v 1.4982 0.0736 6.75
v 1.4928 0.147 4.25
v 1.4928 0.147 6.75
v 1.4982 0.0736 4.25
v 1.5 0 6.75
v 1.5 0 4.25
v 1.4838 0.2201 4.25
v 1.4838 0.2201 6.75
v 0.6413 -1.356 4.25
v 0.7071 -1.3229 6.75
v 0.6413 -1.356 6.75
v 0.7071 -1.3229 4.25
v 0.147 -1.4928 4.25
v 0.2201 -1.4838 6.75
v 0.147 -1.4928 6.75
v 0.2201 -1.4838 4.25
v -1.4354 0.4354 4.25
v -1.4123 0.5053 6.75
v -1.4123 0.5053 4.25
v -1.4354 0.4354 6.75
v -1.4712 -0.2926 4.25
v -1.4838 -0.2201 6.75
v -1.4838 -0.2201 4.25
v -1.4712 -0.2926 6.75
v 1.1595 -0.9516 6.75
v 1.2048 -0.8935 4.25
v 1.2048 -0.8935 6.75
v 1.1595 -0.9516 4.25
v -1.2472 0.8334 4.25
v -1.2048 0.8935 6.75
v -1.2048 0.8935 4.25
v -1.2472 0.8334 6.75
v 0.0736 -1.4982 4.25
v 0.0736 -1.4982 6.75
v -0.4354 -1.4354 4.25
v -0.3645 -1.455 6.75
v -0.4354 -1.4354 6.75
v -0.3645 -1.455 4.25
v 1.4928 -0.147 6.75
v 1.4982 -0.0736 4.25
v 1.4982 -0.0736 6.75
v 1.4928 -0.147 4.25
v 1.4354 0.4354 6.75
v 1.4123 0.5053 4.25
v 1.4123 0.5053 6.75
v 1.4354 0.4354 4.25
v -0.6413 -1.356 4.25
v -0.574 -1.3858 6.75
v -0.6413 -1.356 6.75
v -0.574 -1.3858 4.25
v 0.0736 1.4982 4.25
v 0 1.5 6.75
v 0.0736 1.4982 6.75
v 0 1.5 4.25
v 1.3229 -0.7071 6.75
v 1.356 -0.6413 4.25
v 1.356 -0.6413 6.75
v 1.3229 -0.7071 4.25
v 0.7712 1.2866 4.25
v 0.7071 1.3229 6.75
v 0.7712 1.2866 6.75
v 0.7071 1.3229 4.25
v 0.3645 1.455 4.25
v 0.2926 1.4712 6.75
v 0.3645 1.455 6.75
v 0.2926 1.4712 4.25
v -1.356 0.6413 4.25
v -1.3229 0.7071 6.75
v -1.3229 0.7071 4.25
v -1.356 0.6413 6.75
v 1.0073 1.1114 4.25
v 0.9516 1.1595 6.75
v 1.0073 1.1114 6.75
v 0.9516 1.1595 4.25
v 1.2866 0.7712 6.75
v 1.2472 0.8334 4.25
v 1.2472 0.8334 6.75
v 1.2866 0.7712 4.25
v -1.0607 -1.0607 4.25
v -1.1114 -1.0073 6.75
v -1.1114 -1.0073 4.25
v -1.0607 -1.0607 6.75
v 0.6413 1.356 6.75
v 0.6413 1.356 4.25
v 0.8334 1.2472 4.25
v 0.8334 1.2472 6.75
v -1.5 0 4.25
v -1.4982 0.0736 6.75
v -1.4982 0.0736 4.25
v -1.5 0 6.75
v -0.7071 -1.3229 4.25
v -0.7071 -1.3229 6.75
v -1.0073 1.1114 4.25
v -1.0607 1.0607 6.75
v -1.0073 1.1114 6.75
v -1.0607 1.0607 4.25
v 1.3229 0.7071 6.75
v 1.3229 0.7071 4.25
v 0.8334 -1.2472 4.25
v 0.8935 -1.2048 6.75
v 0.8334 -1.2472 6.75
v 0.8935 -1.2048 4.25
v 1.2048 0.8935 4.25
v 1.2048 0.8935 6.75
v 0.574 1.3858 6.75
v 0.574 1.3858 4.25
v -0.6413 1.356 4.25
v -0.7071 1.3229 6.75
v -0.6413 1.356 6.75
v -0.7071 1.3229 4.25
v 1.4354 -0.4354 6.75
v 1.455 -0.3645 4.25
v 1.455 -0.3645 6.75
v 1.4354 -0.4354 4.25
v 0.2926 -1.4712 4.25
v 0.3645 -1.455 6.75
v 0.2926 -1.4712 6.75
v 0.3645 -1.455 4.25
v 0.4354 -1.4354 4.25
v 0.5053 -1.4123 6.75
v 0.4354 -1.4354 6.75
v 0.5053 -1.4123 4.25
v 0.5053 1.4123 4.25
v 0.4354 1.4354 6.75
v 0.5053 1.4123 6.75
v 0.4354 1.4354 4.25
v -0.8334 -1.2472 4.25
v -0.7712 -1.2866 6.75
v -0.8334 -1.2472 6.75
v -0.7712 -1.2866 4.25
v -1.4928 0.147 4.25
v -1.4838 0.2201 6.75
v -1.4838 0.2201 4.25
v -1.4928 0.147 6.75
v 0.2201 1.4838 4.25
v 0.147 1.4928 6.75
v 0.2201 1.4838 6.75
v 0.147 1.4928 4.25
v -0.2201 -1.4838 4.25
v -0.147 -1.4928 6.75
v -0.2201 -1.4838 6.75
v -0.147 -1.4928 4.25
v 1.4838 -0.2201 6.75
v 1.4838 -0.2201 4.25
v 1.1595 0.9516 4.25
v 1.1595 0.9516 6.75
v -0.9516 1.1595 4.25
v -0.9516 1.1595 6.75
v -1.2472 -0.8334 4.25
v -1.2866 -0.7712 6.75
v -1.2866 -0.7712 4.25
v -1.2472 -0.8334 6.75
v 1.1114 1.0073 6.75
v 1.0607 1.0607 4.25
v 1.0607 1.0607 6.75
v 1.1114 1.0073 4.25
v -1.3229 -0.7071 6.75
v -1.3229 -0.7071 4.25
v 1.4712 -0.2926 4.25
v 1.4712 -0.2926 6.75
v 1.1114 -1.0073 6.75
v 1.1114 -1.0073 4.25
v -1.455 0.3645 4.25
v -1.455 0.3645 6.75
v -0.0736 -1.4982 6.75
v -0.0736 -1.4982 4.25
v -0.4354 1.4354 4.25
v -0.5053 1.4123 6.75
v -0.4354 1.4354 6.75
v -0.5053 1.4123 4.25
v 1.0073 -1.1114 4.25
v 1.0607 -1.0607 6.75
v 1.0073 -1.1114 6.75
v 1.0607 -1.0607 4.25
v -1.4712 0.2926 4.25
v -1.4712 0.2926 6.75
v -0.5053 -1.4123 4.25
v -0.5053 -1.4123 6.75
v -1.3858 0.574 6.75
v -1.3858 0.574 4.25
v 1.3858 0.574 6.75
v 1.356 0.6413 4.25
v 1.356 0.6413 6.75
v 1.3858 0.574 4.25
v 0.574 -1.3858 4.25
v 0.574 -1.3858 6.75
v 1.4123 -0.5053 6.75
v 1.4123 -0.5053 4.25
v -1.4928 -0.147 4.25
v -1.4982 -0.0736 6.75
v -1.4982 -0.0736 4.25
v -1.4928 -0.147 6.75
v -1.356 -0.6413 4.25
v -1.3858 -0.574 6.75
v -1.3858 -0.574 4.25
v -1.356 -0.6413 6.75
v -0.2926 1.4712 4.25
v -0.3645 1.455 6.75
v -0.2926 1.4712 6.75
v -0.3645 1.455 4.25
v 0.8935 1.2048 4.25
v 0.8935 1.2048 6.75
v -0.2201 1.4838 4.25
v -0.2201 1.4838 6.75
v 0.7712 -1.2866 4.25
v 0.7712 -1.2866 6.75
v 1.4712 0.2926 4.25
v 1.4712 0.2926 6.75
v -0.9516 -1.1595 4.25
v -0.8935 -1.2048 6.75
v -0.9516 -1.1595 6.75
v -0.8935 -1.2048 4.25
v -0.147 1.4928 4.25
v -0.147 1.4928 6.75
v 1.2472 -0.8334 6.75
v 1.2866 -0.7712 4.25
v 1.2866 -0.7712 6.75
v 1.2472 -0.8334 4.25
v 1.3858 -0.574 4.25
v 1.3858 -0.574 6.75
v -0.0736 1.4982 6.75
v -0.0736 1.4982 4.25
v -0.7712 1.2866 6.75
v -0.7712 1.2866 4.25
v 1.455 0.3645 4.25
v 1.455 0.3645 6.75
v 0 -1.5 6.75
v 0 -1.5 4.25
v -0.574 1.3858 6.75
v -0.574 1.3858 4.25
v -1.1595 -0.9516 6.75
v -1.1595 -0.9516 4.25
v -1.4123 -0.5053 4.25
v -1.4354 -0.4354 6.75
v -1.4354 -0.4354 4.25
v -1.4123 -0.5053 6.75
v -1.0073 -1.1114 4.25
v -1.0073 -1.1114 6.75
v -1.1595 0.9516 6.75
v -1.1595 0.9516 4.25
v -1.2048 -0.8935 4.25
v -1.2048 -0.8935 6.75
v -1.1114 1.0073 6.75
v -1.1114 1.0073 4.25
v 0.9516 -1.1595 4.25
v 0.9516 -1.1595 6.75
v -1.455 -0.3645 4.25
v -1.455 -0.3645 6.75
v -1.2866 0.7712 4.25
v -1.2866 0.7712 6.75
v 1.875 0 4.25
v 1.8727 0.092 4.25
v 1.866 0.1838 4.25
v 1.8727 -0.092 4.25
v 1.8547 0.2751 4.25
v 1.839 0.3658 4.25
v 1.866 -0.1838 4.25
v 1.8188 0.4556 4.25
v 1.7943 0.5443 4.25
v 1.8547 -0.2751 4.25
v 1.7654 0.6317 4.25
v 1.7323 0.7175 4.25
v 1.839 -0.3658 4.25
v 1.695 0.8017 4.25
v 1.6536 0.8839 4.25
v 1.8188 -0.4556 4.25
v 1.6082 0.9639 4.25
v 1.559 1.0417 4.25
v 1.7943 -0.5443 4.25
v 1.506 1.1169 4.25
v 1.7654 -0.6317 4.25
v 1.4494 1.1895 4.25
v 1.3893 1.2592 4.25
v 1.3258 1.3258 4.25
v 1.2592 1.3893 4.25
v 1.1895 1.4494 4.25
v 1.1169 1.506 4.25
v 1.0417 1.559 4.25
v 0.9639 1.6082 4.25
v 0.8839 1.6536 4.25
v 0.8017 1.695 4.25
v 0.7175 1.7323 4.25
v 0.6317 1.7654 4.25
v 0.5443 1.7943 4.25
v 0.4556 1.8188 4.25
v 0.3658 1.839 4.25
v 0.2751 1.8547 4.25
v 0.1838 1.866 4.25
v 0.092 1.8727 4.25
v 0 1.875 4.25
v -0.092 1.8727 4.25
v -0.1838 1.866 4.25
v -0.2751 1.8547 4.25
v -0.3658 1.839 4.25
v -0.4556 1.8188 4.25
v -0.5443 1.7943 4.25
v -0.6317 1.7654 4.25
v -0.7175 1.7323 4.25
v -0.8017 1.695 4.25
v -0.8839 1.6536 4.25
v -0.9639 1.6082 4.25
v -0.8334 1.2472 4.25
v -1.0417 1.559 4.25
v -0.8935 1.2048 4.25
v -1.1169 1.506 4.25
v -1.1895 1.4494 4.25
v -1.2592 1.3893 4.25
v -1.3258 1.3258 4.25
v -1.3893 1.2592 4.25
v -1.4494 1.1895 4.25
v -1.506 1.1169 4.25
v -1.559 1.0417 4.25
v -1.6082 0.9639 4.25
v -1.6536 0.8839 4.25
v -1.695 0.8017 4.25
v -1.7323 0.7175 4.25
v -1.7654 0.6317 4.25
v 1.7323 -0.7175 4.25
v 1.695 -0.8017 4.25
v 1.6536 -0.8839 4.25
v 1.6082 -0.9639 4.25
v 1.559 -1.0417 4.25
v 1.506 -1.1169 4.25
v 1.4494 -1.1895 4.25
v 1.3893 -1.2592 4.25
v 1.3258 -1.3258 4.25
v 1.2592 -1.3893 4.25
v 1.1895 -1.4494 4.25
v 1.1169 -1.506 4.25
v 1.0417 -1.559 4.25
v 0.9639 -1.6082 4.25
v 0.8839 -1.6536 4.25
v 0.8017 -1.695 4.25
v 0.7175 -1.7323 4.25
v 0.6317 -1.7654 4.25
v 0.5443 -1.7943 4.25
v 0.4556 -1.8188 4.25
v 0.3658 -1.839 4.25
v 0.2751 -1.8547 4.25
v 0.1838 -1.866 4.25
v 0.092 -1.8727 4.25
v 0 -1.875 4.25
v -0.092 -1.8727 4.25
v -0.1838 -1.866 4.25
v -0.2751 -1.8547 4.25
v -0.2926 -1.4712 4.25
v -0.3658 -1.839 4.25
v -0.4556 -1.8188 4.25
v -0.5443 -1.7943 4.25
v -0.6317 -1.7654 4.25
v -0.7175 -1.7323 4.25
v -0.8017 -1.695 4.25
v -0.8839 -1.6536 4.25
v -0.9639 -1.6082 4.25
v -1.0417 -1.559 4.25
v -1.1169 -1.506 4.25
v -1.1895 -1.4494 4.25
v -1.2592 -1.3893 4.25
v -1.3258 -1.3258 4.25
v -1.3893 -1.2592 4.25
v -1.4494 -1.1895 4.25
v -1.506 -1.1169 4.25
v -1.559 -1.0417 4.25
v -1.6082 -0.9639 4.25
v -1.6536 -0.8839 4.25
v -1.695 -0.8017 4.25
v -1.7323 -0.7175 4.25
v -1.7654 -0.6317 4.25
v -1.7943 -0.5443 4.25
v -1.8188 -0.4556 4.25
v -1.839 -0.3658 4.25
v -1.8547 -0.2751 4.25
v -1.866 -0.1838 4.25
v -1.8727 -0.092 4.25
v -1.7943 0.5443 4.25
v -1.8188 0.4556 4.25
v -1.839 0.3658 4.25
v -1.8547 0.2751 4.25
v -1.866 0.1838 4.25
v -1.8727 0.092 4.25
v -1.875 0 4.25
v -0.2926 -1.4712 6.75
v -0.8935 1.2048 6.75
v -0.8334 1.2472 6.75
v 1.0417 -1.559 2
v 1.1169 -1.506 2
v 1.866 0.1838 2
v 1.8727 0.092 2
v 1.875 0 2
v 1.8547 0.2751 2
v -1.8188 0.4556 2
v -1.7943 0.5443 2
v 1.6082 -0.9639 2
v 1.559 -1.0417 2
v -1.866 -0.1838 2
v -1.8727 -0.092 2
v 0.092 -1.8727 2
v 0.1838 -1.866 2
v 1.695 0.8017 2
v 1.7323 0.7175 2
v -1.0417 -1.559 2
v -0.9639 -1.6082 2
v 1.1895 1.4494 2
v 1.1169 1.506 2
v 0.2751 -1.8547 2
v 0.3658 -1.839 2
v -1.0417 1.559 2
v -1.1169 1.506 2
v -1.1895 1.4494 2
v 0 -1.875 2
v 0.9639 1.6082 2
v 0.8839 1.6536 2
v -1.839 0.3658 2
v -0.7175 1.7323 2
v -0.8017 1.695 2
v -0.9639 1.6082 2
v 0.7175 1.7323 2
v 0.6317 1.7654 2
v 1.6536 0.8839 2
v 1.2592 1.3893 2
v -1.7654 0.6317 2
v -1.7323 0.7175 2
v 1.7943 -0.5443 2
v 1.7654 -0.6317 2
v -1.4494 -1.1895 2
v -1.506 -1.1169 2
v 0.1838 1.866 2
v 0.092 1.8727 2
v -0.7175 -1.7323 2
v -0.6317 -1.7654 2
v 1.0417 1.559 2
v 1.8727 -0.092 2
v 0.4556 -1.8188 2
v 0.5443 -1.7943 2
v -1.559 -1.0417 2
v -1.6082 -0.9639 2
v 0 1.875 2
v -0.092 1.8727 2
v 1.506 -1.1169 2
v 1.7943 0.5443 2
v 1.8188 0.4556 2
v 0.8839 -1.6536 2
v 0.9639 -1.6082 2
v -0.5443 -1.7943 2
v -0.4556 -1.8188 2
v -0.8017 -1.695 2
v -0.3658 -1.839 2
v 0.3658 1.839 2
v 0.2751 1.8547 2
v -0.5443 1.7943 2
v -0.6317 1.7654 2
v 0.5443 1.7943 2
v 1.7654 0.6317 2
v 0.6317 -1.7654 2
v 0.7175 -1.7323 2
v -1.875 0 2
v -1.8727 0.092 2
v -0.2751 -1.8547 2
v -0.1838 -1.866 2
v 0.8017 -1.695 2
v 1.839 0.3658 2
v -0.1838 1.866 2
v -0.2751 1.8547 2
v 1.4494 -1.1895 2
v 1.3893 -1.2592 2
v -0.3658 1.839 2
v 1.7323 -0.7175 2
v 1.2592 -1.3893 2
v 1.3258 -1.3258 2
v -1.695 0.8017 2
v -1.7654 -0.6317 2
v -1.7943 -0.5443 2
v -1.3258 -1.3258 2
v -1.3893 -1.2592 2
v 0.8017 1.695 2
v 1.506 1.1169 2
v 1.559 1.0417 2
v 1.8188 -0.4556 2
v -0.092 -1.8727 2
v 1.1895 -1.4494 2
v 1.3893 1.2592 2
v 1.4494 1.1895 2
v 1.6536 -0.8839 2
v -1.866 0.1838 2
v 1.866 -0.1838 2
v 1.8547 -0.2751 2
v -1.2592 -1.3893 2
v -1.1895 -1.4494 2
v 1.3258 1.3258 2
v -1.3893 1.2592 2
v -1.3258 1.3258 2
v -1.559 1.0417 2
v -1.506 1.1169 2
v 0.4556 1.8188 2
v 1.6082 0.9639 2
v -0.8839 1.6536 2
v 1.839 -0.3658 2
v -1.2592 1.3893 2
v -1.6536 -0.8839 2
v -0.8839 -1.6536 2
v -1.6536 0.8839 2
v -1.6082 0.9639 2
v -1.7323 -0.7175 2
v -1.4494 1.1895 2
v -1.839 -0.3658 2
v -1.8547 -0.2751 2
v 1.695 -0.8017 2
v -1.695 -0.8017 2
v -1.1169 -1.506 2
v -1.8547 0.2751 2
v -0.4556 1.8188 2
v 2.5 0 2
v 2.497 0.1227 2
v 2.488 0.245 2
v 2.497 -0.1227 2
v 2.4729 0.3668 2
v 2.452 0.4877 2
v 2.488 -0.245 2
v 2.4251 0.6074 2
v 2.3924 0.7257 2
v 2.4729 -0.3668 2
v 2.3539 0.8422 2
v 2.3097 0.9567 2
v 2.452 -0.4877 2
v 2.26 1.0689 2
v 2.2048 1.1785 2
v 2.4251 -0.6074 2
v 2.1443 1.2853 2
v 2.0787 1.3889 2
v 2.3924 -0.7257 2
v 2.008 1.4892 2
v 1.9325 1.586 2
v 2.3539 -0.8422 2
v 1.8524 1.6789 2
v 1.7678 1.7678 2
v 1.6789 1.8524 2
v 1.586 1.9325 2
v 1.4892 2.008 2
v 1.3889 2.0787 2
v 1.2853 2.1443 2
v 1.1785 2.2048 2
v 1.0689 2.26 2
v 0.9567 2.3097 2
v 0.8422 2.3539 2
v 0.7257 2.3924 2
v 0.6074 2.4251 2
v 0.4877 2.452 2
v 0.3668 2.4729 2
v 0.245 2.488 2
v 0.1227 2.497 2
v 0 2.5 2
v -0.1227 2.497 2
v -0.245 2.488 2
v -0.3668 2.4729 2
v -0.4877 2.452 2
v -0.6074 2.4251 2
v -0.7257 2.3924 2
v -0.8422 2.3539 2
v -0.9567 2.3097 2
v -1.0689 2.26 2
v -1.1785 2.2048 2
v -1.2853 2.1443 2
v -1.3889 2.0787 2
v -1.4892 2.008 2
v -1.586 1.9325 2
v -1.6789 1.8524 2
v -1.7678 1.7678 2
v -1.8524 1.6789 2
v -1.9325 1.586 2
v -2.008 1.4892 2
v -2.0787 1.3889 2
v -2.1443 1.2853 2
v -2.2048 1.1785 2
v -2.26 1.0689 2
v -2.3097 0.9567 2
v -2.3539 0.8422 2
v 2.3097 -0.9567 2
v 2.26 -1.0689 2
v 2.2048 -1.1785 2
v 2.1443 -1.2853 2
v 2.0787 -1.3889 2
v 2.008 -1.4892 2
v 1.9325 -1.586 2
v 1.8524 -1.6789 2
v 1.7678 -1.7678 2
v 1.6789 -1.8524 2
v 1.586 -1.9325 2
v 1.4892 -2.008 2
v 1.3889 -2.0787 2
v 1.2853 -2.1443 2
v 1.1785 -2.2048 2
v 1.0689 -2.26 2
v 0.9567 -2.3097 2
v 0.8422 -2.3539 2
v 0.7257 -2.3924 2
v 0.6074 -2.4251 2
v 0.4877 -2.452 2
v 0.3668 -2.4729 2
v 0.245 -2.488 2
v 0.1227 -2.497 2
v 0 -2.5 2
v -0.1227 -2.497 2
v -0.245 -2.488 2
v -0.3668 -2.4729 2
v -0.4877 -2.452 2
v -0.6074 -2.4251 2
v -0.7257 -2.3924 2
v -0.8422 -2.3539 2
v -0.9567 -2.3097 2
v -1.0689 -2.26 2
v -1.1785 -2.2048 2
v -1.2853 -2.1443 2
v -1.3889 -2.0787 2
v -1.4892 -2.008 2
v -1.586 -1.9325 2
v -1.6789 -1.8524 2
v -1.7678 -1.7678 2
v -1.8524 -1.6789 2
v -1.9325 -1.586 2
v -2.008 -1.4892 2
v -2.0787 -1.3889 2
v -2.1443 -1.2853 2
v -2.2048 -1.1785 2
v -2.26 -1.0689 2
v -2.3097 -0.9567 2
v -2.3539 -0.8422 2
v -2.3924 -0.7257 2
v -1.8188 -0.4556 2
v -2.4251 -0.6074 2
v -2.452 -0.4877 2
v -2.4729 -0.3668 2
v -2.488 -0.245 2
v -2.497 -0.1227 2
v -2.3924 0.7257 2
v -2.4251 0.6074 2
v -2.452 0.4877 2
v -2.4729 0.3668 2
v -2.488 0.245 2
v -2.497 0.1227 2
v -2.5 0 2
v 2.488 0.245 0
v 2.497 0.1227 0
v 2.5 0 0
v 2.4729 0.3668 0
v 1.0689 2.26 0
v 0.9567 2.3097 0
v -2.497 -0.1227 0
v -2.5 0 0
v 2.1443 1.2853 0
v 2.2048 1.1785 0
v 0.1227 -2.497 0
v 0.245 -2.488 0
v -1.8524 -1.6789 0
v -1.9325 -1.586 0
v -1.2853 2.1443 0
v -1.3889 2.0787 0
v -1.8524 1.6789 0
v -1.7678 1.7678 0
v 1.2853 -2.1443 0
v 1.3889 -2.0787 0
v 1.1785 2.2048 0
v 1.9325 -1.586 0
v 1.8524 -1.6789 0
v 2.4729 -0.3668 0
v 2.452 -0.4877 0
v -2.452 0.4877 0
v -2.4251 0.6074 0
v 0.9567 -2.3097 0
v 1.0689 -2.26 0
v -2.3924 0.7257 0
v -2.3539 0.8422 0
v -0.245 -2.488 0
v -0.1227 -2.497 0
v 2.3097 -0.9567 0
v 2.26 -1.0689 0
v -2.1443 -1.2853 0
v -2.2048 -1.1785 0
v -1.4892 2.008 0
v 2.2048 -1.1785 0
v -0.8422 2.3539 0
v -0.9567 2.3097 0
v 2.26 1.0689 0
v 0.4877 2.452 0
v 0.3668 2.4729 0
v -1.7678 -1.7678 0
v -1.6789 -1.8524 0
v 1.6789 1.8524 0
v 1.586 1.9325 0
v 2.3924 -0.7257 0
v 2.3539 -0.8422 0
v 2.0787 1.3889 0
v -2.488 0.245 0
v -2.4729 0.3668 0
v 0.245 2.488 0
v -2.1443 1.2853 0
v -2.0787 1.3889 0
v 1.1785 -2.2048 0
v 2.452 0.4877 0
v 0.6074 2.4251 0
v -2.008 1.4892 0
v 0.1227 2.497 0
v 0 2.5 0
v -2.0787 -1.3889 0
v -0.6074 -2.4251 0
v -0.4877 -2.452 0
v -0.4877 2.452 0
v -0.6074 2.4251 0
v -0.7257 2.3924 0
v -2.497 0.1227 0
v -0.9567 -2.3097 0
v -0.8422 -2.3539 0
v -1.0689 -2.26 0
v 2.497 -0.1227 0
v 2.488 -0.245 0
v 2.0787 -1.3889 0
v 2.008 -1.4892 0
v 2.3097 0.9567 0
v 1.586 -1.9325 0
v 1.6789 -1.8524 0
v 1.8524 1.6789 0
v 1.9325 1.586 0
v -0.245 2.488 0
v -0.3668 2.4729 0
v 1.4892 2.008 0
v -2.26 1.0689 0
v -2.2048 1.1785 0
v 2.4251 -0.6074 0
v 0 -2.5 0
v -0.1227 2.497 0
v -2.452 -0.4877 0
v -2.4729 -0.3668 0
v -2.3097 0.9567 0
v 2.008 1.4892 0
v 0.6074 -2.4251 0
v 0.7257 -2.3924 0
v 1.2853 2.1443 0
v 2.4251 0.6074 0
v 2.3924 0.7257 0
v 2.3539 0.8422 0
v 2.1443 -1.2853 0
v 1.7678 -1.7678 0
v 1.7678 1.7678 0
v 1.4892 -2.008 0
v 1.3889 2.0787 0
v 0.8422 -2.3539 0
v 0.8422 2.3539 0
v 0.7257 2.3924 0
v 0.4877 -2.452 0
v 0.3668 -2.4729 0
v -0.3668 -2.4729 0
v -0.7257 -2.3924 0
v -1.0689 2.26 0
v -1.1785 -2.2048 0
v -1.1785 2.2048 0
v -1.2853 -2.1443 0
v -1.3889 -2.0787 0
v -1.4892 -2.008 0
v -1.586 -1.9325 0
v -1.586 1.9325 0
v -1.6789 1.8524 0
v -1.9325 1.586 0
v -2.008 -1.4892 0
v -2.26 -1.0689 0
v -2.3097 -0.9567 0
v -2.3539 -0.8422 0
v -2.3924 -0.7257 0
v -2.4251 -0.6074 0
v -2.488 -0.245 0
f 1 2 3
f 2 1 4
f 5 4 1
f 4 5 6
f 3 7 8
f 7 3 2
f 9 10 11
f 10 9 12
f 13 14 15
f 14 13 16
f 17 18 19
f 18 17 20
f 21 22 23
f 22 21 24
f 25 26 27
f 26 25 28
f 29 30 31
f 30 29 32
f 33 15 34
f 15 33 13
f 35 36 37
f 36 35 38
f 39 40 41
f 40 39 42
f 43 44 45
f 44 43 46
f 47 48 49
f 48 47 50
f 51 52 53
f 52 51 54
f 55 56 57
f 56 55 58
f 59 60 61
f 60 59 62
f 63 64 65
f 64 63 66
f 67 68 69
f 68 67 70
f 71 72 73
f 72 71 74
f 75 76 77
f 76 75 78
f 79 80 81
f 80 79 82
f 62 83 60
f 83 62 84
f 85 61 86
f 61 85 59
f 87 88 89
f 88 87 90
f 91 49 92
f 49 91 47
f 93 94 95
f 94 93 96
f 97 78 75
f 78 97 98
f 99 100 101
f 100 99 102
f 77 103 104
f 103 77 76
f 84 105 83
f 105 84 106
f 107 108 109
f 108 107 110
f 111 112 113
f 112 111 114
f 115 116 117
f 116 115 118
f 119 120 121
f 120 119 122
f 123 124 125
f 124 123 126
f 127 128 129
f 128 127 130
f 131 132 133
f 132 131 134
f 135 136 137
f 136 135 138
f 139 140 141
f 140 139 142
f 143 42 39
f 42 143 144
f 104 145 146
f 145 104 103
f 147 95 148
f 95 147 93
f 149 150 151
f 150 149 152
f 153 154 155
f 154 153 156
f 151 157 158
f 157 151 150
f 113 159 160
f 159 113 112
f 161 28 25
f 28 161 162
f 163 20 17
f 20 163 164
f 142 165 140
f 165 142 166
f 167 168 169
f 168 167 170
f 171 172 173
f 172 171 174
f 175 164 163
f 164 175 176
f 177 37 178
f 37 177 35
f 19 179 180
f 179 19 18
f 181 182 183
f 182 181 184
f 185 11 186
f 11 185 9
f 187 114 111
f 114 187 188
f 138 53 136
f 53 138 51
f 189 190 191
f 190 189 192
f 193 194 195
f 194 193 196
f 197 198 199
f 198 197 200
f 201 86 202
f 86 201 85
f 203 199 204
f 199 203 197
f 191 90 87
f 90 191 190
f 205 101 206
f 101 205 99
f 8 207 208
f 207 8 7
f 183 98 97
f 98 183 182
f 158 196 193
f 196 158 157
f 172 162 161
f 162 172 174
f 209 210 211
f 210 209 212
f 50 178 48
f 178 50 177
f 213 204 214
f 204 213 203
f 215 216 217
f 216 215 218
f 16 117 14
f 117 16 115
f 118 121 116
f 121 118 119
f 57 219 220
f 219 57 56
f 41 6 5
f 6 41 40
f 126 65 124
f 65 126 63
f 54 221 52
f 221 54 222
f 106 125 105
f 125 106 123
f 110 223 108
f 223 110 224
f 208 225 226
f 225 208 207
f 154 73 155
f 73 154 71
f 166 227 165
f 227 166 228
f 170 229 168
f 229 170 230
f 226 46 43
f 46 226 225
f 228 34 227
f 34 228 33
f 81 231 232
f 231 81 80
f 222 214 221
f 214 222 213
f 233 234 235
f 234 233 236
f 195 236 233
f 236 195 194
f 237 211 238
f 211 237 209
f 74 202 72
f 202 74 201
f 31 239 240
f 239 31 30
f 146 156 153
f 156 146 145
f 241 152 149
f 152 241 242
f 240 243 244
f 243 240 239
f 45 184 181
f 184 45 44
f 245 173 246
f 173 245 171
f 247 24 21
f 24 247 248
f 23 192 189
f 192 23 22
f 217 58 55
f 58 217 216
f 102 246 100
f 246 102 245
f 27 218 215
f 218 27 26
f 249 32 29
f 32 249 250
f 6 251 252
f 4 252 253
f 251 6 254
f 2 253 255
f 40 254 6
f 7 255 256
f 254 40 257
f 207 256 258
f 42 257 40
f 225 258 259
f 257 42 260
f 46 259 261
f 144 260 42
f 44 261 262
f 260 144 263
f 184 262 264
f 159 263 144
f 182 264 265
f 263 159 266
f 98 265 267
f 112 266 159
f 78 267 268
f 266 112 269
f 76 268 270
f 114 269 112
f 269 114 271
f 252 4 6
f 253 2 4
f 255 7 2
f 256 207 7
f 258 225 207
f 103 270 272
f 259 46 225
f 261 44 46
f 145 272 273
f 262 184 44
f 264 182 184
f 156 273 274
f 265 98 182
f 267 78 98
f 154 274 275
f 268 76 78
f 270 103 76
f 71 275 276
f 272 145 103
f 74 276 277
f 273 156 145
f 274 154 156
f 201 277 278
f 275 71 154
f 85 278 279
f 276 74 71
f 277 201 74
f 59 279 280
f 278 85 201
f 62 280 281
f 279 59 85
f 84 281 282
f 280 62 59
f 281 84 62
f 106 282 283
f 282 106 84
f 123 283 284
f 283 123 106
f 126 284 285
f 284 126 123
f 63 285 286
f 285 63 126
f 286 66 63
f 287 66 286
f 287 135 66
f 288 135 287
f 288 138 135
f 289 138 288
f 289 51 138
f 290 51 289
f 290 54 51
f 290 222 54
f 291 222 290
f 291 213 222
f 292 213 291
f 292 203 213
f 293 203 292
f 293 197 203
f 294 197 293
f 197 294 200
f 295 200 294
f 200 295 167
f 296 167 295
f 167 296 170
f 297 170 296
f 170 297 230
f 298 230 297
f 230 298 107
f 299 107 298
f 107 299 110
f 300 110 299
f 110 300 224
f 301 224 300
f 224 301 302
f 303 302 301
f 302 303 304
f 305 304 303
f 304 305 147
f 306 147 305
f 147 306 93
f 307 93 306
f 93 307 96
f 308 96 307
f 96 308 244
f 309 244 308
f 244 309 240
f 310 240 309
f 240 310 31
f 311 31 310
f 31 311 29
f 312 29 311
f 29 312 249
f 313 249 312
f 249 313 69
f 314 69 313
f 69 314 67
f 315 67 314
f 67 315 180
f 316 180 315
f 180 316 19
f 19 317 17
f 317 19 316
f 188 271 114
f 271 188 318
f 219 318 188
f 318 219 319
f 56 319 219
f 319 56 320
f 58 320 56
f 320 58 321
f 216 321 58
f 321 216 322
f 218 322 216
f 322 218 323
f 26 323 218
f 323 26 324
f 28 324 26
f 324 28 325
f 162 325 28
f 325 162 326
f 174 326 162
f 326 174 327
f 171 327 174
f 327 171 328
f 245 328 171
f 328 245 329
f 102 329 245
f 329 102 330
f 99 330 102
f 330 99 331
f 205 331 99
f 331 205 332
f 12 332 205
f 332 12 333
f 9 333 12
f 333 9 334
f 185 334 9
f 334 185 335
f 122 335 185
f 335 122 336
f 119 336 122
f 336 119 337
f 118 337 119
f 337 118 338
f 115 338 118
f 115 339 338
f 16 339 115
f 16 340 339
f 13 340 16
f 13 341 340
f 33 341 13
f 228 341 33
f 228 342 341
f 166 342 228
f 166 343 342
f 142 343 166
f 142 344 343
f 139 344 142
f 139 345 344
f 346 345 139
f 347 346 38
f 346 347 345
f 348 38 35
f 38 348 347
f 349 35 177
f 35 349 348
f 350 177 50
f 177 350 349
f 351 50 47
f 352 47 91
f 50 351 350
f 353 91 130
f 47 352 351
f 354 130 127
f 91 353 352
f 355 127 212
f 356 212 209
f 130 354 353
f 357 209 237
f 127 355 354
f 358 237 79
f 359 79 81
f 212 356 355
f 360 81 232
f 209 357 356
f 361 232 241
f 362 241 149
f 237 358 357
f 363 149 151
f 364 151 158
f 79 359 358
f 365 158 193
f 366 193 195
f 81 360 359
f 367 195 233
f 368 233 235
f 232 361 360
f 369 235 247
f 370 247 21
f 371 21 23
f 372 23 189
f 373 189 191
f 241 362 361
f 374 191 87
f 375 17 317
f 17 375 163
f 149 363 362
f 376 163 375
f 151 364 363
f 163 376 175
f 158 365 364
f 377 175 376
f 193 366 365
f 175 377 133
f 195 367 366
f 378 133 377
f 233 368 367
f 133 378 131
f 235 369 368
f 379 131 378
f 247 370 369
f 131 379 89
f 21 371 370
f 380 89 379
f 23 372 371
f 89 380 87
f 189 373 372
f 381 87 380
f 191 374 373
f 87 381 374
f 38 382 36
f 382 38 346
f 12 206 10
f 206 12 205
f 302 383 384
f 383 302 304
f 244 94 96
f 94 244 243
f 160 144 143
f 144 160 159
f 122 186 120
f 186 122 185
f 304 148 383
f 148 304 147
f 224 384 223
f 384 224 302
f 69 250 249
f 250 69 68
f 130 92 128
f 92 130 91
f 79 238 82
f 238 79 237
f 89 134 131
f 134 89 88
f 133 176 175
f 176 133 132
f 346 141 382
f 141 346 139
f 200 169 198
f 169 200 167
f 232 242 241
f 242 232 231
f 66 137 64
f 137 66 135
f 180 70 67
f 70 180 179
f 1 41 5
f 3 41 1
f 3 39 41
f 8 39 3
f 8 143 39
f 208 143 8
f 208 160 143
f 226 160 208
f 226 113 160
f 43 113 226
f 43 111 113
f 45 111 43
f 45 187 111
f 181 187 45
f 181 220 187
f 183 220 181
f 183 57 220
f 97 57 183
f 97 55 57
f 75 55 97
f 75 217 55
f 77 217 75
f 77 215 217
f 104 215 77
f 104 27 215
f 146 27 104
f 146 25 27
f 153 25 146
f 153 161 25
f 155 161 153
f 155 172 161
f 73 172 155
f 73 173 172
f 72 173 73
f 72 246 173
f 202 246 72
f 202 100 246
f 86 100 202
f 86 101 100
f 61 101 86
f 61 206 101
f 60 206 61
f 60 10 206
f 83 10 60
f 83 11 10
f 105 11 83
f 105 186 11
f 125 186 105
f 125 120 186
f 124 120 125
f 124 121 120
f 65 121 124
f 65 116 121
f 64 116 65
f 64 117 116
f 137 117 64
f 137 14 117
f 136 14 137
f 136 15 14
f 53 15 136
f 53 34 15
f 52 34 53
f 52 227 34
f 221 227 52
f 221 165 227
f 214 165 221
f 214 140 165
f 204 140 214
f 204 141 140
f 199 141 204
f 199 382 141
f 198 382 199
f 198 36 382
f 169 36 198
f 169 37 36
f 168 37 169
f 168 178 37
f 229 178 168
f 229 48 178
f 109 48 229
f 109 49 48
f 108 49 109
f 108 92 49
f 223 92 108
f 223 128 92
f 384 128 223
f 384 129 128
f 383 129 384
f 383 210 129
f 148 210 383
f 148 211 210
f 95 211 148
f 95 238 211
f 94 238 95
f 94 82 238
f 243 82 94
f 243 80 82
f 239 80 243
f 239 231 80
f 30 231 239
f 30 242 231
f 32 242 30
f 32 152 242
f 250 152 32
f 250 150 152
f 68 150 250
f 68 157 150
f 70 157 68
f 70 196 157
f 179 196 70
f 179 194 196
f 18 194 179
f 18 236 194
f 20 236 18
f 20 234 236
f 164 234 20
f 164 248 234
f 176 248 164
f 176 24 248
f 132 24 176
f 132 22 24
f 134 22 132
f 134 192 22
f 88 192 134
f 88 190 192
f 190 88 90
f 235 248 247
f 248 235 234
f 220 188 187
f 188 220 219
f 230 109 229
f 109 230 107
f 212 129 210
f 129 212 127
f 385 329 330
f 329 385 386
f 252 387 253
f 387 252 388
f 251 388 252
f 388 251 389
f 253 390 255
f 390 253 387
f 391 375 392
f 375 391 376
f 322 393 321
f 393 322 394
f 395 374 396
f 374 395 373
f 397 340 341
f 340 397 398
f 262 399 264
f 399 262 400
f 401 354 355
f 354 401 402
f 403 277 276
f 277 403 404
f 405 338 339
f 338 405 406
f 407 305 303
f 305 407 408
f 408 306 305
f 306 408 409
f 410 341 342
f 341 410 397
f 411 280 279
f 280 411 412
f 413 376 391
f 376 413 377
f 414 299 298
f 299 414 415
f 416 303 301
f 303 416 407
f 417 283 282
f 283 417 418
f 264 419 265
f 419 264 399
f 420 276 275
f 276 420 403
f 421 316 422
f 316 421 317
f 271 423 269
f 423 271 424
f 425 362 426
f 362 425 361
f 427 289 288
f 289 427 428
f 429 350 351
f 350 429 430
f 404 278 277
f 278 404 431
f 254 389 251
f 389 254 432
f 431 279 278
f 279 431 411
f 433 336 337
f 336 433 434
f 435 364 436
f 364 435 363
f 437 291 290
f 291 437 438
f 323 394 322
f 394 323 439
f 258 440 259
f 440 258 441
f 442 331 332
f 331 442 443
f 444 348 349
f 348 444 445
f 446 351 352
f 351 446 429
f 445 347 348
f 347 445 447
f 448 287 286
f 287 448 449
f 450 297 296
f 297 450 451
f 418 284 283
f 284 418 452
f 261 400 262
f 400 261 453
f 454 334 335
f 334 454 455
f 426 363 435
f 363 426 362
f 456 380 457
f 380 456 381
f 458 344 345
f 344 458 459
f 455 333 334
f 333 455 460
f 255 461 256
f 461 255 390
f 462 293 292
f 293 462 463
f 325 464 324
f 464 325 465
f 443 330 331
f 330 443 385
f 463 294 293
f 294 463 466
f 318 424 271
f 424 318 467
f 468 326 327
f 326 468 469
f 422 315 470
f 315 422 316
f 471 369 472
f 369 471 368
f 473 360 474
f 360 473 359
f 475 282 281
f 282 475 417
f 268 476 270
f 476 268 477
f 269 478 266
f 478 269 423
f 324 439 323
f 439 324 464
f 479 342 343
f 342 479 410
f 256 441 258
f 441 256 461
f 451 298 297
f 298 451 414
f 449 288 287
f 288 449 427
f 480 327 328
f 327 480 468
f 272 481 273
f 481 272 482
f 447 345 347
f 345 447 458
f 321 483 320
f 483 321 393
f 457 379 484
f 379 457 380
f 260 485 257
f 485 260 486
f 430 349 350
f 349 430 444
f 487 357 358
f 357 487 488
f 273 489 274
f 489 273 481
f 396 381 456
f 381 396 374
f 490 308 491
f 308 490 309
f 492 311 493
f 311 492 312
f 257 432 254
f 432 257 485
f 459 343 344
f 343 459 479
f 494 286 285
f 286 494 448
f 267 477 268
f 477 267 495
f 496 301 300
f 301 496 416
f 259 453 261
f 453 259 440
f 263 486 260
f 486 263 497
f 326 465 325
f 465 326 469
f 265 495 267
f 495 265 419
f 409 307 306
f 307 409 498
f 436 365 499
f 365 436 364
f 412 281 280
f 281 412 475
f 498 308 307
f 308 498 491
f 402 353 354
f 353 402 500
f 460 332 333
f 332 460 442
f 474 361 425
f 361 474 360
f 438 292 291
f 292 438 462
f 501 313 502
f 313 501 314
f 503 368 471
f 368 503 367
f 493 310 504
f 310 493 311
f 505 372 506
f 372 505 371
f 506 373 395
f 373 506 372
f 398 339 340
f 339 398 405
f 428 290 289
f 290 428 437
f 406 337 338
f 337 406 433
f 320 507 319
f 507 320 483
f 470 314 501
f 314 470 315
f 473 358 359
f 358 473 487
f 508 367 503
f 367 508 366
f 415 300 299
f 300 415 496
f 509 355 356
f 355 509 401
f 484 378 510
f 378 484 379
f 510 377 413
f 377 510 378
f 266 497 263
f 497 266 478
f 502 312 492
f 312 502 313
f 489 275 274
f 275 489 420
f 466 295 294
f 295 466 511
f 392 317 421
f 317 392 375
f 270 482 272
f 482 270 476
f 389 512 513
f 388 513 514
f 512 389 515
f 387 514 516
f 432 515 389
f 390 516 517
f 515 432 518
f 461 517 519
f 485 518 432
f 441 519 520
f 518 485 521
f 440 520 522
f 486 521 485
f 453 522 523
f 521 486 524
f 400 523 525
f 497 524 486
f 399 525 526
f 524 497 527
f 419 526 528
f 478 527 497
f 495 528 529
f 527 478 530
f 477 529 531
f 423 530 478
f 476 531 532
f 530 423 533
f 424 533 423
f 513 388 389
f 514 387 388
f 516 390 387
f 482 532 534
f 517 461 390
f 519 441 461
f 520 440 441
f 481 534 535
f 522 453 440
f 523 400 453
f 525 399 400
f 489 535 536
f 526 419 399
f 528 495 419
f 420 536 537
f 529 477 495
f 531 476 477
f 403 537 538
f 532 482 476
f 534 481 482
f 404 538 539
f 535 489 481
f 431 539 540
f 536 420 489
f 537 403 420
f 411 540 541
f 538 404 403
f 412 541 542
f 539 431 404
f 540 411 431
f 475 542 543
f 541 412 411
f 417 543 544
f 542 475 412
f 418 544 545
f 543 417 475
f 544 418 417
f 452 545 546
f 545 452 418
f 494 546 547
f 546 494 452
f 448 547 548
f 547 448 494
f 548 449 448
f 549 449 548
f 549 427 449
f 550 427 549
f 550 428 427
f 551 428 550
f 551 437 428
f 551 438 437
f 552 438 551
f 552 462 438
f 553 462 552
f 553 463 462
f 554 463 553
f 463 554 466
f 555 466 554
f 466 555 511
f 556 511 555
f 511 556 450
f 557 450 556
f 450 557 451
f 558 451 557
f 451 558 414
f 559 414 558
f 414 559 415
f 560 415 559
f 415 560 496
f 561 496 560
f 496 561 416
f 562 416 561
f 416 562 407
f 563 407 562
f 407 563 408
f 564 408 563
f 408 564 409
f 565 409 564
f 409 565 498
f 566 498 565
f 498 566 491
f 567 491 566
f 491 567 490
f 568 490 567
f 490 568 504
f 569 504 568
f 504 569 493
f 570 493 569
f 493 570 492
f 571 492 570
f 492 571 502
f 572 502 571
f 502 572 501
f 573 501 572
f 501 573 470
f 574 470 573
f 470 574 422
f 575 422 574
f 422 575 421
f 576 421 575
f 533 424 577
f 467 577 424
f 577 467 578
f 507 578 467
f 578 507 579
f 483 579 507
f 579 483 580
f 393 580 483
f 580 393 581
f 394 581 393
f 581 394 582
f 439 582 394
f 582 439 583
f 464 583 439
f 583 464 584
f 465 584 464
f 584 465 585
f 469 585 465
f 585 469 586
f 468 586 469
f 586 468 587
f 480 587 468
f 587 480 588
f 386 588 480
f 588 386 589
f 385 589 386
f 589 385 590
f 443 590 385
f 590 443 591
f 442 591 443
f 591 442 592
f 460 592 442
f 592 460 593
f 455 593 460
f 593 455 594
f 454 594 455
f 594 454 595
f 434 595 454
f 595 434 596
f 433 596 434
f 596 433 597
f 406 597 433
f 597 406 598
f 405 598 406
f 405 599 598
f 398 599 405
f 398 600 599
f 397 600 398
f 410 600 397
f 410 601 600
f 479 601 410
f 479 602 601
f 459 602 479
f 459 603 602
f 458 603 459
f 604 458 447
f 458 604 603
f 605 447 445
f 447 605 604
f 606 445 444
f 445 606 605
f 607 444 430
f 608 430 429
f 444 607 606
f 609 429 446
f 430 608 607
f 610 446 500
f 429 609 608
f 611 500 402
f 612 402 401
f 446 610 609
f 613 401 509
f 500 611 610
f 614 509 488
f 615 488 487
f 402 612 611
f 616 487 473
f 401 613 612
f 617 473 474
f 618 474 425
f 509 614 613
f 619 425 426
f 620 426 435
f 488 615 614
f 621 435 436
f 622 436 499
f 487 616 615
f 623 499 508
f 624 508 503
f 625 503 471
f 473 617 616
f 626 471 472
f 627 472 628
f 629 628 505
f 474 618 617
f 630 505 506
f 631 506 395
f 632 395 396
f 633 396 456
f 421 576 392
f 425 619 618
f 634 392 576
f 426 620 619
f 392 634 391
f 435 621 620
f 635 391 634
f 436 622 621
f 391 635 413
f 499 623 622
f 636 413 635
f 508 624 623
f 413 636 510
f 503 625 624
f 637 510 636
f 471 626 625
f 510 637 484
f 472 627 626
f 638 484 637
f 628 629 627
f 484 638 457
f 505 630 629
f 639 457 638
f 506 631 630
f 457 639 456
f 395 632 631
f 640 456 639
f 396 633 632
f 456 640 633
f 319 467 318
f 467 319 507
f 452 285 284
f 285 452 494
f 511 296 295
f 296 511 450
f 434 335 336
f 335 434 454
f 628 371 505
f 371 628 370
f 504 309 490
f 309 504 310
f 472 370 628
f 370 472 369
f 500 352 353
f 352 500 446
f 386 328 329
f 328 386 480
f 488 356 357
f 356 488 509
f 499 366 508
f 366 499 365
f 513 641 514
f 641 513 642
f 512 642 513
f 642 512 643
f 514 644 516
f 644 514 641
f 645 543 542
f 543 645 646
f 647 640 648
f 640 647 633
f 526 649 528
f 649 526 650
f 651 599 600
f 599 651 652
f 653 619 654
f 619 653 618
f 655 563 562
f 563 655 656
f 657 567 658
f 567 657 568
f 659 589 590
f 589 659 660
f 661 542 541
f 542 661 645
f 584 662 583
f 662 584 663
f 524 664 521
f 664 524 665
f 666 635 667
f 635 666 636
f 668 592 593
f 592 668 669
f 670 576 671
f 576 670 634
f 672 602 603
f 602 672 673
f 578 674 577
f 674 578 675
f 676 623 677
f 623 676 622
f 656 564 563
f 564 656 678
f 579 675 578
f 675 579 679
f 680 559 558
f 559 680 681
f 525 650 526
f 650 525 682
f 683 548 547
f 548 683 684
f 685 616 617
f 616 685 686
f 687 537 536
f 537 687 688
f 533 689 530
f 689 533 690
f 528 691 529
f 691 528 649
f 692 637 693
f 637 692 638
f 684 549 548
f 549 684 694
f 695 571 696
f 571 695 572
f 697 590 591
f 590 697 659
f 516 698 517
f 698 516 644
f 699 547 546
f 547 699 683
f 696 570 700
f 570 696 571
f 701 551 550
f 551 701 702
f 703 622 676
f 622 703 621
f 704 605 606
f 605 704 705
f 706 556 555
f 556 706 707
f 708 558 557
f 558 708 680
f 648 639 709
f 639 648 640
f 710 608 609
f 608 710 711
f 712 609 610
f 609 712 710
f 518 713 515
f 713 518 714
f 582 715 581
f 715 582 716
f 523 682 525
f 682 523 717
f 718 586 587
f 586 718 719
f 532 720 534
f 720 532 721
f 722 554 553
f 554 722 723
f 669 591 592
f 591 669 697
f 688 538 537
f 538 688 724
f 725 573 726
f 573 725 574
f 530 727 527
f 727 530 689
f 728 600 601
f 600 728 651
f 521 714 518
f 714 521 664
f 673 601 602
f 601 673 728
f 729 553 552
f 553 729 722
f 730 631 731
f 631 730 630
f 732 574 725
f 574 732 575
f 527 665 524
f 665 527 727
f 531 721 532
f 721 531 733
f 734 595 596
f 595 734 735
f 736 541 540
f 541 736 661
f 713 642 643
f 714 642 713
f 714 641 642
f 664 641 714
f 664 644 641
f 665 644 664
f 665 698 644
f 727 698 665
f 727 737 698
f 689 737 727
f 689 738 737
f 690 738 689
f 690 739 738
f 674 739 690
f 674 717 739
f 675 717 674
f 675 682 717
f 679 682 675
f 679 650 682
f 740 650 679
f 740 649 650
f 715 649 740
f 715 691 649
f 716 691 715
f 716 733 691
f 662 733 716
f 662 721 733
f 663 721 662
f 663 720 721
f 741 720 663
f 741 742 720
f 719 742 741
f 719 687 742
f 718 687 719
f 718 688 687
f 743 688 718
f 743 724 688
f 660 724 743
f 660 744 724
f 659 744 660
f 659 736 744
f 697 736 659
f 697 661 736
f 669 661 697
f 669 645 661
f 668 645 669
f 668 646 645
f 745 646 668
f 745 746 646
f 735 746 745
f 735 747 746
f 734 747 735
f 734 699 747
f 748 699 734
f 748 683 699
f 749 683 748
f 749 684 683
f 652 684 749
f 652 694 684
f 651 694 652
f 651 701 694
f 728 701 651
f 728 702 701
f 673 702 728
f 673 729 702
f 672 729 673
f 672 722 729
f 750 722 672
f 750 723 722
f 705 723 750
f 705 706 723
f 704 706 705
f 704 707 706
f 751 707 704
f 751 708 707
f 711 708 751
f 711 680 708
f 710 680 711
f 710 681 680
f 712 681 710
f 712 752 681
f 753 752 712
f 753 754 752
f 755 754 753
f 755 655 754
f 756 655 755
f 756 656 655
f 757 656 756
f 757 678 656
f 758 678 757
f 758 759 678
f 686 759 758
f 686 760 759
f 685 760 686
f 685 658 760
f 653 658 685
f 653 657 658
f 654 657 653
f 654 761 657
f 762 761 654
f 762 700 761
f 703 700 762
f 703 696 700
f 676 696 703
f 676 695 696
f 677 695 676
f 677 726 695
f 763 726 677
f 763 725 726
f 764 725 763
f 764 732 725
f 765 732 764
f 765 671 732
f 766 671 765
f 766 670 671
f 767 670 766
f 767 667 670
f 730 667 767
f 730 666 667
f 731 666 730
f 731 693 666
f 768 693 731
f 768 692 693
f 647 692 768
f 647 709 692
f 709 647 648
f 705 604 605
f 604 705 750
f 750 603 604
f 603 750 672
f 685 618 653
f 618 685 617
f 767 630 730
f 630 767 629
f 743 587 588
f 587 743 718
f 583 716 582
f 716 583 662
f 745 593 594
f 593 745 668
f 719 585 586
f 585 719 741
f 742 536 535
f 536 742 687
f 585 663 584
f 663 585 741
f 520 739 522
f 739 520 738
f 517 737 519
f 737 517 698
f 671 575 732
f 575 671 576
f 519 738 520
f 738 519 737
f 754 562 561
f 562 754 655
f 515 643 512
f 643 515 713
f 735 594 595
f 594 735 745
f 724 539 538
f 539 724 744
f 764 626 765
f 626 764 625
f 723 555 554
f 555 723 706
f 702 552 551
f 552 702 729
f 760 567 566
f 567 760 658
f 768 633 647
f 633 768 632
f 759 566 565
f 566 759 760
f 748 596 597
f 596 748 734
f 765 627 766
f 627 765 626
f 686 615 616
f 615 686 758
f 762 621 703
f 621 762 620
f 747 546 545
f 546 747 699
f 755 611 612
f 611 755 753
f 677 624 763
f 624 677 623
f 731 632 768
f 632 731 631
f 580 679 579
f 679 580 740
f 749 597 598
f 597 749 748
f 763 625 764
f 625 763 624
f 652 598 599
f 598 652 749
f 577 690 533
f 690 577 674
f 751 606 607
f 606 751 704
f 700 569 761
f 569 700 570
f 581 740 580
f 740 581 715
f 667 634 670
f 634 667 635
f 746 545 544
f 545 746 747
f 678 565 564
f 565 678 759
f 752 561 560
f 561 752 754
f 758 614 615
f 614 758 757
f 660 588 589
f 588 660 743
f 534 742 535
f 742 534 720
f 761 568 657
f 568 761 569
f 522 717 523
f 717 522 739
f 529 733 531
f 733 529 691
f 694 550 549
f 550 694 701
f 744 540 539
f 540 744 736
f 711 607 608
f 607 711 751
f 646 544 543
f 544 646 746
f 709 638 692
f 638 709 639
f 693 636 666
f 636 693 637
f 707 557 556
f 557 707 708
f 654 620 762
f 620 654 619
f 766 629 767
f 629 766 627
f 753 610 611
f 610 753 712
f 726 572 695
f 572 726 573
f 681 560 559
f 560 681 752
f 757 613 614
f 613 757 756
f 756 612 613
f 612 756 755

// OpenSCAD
peg_h = 2.5;
peg_d = 3;
peg_hole_h = 2.25;
peg_hole_d = 3.75;
peg_stop_h = 2;
peg_stop_d = 5;

$fn = 128;

translate([0, 0, peg_stop_h]) {
    translate([0, 0, peg_hole_h]) {
        cylinder(d=peg_d, h=peg_h);
    }
    cylinder(d=peg_hole_d, h=peg_hole_h);
}
cylinder(d=peg_stop_d, h=peg_stop_h);
